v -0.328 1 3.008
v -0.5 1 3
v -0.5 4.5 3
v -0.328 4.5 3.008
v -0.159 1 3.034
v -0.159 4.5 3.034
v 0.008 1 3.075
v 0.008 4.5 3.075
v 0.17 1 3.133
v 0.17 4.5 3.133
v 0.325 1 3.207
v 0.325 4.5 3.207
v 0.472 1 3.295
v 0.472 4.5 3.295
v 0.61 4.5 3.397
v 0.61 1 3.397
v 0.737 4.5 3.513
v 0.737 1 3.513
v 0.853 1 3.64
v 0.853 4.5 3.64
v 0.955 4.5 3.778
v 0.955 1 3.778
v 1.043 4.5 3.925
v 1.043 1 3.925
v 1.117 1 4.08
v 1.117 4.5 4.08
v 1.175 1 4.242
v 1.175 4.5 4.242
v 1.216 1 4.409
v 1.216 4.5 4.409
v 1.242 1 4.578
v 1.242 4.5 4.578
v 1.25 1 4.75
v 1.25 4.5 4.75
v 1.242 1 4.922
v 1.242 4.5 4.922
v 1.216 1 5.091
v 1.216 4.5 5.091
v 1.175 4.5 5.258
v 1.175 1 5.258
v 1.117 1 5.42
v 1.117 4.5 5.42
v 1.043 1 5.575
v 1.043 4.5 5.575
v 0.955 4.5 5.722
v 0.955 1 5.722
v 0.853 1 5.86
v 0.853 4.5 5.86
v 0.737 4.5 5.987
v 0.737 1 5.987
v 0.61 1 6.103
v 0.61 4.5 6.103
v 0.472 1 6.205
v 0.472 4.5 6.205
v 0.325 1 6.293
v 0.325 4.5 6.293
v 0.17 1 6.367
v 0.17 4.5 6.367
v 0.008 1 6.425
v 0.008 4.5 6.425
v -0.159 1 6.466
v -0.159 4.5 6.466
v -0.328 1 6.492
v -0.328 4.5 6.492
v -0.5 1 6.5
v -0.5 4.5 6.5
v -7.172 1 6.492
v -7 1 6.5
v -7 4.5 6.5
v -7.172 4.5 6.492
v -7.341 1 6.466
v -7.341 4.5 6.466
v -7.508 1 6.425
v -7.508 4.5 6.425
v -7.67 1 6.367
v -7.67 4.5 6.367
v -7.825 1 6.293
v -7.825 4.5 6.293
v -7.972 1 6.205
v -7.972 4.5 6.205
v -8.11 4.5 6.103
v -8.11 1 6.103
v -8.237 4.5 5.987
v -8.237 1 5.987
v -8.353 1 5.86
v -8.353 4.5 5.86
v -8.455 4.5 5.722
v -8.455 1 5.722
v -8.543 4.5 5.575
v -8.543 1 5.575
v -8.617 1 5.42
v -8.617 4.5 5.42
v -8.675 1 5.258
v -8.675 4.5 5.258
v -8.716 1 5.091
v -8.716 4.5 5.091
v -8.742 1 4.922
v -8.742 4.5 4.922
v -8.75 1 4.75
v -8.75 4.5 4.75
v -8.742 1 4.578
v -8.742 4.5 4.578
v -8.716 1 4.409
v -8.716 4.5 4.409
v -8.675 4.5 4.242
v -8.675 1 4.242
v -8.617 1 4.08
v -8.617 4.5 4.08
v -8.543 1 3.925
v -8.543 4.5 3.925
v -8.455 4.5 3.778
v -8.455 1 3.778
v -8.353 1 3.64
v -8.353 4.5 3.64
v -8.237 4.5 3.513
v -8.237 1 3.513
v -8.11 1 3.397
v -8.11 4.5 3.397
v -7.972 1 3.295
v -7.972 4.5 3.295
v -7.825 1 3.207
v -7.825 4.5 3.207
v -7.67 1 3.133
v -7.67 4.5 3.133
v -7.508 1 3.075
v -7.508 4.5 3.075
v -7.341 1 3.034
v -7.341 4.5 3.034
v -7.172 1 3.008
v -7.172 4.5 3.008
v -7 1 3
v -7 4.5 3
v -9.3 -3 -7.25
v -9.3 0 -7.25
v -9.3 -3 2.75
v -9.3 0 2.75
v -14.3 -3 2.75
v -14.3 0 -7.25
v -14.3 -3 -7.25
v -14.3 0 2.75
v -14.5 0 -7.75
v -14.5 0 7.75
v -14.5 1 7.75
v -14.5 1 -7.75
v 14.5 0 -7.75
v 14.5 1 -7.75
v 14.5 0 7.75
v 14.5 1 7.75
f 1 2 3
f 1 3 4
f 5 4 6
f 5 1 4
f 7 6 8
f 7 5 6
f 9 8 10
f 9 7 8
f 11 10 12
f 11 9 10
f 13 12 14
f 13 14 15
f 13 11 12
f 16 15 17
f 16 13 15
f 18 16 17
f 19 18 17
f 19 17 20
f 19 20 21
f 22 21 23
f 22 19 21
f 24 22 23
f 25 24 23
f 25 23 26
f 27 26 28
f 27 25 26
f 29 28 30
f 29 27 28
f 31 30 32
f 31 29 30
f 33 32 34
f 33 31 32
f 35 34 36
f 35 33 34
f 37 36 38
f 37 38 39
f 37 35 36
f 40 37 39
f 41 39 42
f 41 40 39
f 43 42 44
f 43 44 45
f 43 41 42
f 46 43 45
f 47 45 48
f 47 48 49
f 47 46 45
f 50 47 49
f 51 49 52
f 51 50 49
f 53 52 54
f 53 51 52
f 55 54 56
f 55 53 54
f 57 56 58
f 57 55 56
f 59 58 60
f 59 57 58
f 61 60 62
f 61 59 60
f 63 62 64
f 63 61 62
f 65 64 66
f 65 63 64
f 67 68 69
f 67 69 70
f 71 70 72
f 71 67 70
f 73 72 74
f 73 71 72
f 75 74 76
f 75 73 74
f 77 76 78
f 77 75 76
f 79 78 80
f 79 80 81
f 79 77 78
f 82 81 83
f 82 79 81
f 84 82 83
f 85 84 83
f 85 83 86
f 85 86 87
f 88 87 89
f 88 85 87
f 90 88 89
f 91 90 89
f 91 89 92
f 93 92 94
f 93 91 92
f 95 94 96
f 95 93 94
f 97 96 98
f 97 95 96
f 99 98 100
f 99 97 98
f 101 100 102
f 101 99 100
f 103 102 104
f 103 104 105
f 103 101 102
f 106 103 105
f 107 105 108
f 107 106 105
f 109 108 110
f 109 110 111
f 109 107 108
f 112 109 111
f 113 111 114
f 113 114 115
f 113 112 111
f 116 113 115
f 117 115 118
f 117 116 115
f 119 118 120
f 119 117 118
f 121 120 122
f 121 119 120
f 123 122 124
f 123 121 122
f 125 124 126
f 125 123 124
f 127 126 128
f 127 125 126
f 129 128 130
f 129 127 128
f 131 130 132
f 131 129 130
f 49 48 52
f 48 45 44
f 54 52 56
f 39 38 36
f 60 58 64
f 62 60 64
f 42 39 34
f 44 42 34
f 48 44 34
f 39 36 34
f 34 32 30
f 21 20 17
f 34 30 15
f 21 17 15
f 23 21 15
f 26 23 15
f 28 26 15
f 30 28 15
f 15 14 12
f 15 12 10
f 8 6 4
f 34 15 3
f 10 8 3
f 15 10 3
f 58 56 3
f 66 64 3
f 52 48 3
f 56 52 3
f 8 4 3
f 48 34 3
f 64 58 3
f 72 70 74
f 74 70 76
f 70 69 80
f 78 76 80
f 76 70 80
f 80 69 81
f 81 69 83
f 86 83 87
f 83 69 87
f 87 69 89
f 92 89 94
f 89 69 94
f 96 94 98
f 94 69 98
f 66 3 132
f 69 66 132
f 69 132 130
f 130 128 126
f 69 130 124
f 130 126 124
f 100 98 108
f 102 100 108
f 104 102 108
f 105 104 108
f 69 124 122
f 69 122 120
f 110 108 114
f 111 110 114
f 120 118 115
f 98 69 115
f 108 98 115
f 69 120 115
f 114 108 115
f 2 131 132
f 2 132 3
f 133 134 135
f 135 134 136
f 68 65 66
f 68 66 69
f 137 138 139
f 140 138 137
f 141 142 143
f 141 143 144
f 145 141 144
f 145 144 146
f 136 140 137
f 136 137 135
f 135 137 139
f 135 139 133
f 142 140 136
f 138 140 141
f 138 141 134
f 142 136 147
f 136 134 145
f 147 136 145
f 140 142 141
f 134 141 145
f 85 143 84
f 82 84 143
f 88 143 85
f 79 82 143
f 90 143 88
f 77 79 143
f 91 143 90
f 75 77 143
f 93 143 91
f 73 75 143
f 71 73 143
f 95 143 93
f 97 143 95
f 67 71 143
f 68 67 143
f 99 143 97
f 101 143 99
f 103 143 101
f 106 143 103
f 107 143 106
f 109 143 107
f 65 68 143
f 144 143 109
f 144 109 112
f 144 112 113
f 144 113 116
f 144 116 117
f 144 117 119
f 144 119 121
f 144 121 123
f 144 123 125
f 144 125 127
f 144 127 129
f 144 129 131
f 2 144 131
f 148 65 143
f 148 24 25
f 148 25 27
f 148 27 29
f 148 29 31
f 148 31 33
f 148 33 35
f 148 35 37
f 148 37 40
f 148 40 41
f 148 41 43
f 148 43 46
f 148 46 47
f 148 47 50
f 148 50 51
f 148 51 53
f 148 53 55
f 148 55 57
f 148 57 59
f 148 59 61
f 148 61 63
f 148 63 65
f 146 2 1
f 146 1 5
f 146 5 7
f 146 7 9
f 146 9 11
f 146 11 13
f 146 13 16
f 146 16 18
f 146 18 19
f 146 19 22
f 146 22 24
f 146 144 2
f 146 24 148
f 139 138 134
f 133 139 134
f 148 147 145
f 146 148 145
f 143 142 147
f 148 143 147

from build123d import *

# Parameters (mm, degrees)
SKETCH1_W           = 29
SKETCH1_H           = 15.5
BOSS_EXTRUDE1_DEPTH = 1
BOSS_EXTRUDE2_DEPTH = 3.5
SKETCH4_W           = 5
SKETCH4_H           = 10
BOSS_EXTRUDE3_DEPTH = 3


with BuildPart() as part:
    # Sketch1 → Boss-Extrude1 (new body)
    with BuildSketch(Plane(origin=(0, 0, 0), x_dir=(1, 0, 0), z_dir=(0, 1, 0))):
        Rectangle(SKETCH1_W, SKETCH1_H)
    extrude(amount=BOSS_EXTRUDE1_DEPTH)

    # Sketch2 → Boss-Extrude2 (add)
    with BuildSketch(Plane(origin=(0, 1, 0), x_dir=(1, 0, 0), z_dir=(0, 1, 0))):
        with BuildLine():
            Line((-7, -3), (-0.5, -3))
            ThreePointArc((-0.5, -3), (1.25, -4.75), (-0.5, -6.5))
            Line((-0.5, -6.5), (-7, -6.5))
            ThreePointArc((-7, -6.5), (-8.75, -4.75), (-7, -3))
        make_face()
    extrude(amount=BOSS_EXTRUDE2_DEPTH)

    # Sketch4 → Boss-Extrude3 (add)
    with BuildSketch(Plane.XZ):
        with Locations((-11.8, -2.25)):
            Rectangle(SKETCH4_W, SKETCH4_H)
    extrude(amount=BOSS_EXTRUDE3_DEPTH)


solid = part.part
